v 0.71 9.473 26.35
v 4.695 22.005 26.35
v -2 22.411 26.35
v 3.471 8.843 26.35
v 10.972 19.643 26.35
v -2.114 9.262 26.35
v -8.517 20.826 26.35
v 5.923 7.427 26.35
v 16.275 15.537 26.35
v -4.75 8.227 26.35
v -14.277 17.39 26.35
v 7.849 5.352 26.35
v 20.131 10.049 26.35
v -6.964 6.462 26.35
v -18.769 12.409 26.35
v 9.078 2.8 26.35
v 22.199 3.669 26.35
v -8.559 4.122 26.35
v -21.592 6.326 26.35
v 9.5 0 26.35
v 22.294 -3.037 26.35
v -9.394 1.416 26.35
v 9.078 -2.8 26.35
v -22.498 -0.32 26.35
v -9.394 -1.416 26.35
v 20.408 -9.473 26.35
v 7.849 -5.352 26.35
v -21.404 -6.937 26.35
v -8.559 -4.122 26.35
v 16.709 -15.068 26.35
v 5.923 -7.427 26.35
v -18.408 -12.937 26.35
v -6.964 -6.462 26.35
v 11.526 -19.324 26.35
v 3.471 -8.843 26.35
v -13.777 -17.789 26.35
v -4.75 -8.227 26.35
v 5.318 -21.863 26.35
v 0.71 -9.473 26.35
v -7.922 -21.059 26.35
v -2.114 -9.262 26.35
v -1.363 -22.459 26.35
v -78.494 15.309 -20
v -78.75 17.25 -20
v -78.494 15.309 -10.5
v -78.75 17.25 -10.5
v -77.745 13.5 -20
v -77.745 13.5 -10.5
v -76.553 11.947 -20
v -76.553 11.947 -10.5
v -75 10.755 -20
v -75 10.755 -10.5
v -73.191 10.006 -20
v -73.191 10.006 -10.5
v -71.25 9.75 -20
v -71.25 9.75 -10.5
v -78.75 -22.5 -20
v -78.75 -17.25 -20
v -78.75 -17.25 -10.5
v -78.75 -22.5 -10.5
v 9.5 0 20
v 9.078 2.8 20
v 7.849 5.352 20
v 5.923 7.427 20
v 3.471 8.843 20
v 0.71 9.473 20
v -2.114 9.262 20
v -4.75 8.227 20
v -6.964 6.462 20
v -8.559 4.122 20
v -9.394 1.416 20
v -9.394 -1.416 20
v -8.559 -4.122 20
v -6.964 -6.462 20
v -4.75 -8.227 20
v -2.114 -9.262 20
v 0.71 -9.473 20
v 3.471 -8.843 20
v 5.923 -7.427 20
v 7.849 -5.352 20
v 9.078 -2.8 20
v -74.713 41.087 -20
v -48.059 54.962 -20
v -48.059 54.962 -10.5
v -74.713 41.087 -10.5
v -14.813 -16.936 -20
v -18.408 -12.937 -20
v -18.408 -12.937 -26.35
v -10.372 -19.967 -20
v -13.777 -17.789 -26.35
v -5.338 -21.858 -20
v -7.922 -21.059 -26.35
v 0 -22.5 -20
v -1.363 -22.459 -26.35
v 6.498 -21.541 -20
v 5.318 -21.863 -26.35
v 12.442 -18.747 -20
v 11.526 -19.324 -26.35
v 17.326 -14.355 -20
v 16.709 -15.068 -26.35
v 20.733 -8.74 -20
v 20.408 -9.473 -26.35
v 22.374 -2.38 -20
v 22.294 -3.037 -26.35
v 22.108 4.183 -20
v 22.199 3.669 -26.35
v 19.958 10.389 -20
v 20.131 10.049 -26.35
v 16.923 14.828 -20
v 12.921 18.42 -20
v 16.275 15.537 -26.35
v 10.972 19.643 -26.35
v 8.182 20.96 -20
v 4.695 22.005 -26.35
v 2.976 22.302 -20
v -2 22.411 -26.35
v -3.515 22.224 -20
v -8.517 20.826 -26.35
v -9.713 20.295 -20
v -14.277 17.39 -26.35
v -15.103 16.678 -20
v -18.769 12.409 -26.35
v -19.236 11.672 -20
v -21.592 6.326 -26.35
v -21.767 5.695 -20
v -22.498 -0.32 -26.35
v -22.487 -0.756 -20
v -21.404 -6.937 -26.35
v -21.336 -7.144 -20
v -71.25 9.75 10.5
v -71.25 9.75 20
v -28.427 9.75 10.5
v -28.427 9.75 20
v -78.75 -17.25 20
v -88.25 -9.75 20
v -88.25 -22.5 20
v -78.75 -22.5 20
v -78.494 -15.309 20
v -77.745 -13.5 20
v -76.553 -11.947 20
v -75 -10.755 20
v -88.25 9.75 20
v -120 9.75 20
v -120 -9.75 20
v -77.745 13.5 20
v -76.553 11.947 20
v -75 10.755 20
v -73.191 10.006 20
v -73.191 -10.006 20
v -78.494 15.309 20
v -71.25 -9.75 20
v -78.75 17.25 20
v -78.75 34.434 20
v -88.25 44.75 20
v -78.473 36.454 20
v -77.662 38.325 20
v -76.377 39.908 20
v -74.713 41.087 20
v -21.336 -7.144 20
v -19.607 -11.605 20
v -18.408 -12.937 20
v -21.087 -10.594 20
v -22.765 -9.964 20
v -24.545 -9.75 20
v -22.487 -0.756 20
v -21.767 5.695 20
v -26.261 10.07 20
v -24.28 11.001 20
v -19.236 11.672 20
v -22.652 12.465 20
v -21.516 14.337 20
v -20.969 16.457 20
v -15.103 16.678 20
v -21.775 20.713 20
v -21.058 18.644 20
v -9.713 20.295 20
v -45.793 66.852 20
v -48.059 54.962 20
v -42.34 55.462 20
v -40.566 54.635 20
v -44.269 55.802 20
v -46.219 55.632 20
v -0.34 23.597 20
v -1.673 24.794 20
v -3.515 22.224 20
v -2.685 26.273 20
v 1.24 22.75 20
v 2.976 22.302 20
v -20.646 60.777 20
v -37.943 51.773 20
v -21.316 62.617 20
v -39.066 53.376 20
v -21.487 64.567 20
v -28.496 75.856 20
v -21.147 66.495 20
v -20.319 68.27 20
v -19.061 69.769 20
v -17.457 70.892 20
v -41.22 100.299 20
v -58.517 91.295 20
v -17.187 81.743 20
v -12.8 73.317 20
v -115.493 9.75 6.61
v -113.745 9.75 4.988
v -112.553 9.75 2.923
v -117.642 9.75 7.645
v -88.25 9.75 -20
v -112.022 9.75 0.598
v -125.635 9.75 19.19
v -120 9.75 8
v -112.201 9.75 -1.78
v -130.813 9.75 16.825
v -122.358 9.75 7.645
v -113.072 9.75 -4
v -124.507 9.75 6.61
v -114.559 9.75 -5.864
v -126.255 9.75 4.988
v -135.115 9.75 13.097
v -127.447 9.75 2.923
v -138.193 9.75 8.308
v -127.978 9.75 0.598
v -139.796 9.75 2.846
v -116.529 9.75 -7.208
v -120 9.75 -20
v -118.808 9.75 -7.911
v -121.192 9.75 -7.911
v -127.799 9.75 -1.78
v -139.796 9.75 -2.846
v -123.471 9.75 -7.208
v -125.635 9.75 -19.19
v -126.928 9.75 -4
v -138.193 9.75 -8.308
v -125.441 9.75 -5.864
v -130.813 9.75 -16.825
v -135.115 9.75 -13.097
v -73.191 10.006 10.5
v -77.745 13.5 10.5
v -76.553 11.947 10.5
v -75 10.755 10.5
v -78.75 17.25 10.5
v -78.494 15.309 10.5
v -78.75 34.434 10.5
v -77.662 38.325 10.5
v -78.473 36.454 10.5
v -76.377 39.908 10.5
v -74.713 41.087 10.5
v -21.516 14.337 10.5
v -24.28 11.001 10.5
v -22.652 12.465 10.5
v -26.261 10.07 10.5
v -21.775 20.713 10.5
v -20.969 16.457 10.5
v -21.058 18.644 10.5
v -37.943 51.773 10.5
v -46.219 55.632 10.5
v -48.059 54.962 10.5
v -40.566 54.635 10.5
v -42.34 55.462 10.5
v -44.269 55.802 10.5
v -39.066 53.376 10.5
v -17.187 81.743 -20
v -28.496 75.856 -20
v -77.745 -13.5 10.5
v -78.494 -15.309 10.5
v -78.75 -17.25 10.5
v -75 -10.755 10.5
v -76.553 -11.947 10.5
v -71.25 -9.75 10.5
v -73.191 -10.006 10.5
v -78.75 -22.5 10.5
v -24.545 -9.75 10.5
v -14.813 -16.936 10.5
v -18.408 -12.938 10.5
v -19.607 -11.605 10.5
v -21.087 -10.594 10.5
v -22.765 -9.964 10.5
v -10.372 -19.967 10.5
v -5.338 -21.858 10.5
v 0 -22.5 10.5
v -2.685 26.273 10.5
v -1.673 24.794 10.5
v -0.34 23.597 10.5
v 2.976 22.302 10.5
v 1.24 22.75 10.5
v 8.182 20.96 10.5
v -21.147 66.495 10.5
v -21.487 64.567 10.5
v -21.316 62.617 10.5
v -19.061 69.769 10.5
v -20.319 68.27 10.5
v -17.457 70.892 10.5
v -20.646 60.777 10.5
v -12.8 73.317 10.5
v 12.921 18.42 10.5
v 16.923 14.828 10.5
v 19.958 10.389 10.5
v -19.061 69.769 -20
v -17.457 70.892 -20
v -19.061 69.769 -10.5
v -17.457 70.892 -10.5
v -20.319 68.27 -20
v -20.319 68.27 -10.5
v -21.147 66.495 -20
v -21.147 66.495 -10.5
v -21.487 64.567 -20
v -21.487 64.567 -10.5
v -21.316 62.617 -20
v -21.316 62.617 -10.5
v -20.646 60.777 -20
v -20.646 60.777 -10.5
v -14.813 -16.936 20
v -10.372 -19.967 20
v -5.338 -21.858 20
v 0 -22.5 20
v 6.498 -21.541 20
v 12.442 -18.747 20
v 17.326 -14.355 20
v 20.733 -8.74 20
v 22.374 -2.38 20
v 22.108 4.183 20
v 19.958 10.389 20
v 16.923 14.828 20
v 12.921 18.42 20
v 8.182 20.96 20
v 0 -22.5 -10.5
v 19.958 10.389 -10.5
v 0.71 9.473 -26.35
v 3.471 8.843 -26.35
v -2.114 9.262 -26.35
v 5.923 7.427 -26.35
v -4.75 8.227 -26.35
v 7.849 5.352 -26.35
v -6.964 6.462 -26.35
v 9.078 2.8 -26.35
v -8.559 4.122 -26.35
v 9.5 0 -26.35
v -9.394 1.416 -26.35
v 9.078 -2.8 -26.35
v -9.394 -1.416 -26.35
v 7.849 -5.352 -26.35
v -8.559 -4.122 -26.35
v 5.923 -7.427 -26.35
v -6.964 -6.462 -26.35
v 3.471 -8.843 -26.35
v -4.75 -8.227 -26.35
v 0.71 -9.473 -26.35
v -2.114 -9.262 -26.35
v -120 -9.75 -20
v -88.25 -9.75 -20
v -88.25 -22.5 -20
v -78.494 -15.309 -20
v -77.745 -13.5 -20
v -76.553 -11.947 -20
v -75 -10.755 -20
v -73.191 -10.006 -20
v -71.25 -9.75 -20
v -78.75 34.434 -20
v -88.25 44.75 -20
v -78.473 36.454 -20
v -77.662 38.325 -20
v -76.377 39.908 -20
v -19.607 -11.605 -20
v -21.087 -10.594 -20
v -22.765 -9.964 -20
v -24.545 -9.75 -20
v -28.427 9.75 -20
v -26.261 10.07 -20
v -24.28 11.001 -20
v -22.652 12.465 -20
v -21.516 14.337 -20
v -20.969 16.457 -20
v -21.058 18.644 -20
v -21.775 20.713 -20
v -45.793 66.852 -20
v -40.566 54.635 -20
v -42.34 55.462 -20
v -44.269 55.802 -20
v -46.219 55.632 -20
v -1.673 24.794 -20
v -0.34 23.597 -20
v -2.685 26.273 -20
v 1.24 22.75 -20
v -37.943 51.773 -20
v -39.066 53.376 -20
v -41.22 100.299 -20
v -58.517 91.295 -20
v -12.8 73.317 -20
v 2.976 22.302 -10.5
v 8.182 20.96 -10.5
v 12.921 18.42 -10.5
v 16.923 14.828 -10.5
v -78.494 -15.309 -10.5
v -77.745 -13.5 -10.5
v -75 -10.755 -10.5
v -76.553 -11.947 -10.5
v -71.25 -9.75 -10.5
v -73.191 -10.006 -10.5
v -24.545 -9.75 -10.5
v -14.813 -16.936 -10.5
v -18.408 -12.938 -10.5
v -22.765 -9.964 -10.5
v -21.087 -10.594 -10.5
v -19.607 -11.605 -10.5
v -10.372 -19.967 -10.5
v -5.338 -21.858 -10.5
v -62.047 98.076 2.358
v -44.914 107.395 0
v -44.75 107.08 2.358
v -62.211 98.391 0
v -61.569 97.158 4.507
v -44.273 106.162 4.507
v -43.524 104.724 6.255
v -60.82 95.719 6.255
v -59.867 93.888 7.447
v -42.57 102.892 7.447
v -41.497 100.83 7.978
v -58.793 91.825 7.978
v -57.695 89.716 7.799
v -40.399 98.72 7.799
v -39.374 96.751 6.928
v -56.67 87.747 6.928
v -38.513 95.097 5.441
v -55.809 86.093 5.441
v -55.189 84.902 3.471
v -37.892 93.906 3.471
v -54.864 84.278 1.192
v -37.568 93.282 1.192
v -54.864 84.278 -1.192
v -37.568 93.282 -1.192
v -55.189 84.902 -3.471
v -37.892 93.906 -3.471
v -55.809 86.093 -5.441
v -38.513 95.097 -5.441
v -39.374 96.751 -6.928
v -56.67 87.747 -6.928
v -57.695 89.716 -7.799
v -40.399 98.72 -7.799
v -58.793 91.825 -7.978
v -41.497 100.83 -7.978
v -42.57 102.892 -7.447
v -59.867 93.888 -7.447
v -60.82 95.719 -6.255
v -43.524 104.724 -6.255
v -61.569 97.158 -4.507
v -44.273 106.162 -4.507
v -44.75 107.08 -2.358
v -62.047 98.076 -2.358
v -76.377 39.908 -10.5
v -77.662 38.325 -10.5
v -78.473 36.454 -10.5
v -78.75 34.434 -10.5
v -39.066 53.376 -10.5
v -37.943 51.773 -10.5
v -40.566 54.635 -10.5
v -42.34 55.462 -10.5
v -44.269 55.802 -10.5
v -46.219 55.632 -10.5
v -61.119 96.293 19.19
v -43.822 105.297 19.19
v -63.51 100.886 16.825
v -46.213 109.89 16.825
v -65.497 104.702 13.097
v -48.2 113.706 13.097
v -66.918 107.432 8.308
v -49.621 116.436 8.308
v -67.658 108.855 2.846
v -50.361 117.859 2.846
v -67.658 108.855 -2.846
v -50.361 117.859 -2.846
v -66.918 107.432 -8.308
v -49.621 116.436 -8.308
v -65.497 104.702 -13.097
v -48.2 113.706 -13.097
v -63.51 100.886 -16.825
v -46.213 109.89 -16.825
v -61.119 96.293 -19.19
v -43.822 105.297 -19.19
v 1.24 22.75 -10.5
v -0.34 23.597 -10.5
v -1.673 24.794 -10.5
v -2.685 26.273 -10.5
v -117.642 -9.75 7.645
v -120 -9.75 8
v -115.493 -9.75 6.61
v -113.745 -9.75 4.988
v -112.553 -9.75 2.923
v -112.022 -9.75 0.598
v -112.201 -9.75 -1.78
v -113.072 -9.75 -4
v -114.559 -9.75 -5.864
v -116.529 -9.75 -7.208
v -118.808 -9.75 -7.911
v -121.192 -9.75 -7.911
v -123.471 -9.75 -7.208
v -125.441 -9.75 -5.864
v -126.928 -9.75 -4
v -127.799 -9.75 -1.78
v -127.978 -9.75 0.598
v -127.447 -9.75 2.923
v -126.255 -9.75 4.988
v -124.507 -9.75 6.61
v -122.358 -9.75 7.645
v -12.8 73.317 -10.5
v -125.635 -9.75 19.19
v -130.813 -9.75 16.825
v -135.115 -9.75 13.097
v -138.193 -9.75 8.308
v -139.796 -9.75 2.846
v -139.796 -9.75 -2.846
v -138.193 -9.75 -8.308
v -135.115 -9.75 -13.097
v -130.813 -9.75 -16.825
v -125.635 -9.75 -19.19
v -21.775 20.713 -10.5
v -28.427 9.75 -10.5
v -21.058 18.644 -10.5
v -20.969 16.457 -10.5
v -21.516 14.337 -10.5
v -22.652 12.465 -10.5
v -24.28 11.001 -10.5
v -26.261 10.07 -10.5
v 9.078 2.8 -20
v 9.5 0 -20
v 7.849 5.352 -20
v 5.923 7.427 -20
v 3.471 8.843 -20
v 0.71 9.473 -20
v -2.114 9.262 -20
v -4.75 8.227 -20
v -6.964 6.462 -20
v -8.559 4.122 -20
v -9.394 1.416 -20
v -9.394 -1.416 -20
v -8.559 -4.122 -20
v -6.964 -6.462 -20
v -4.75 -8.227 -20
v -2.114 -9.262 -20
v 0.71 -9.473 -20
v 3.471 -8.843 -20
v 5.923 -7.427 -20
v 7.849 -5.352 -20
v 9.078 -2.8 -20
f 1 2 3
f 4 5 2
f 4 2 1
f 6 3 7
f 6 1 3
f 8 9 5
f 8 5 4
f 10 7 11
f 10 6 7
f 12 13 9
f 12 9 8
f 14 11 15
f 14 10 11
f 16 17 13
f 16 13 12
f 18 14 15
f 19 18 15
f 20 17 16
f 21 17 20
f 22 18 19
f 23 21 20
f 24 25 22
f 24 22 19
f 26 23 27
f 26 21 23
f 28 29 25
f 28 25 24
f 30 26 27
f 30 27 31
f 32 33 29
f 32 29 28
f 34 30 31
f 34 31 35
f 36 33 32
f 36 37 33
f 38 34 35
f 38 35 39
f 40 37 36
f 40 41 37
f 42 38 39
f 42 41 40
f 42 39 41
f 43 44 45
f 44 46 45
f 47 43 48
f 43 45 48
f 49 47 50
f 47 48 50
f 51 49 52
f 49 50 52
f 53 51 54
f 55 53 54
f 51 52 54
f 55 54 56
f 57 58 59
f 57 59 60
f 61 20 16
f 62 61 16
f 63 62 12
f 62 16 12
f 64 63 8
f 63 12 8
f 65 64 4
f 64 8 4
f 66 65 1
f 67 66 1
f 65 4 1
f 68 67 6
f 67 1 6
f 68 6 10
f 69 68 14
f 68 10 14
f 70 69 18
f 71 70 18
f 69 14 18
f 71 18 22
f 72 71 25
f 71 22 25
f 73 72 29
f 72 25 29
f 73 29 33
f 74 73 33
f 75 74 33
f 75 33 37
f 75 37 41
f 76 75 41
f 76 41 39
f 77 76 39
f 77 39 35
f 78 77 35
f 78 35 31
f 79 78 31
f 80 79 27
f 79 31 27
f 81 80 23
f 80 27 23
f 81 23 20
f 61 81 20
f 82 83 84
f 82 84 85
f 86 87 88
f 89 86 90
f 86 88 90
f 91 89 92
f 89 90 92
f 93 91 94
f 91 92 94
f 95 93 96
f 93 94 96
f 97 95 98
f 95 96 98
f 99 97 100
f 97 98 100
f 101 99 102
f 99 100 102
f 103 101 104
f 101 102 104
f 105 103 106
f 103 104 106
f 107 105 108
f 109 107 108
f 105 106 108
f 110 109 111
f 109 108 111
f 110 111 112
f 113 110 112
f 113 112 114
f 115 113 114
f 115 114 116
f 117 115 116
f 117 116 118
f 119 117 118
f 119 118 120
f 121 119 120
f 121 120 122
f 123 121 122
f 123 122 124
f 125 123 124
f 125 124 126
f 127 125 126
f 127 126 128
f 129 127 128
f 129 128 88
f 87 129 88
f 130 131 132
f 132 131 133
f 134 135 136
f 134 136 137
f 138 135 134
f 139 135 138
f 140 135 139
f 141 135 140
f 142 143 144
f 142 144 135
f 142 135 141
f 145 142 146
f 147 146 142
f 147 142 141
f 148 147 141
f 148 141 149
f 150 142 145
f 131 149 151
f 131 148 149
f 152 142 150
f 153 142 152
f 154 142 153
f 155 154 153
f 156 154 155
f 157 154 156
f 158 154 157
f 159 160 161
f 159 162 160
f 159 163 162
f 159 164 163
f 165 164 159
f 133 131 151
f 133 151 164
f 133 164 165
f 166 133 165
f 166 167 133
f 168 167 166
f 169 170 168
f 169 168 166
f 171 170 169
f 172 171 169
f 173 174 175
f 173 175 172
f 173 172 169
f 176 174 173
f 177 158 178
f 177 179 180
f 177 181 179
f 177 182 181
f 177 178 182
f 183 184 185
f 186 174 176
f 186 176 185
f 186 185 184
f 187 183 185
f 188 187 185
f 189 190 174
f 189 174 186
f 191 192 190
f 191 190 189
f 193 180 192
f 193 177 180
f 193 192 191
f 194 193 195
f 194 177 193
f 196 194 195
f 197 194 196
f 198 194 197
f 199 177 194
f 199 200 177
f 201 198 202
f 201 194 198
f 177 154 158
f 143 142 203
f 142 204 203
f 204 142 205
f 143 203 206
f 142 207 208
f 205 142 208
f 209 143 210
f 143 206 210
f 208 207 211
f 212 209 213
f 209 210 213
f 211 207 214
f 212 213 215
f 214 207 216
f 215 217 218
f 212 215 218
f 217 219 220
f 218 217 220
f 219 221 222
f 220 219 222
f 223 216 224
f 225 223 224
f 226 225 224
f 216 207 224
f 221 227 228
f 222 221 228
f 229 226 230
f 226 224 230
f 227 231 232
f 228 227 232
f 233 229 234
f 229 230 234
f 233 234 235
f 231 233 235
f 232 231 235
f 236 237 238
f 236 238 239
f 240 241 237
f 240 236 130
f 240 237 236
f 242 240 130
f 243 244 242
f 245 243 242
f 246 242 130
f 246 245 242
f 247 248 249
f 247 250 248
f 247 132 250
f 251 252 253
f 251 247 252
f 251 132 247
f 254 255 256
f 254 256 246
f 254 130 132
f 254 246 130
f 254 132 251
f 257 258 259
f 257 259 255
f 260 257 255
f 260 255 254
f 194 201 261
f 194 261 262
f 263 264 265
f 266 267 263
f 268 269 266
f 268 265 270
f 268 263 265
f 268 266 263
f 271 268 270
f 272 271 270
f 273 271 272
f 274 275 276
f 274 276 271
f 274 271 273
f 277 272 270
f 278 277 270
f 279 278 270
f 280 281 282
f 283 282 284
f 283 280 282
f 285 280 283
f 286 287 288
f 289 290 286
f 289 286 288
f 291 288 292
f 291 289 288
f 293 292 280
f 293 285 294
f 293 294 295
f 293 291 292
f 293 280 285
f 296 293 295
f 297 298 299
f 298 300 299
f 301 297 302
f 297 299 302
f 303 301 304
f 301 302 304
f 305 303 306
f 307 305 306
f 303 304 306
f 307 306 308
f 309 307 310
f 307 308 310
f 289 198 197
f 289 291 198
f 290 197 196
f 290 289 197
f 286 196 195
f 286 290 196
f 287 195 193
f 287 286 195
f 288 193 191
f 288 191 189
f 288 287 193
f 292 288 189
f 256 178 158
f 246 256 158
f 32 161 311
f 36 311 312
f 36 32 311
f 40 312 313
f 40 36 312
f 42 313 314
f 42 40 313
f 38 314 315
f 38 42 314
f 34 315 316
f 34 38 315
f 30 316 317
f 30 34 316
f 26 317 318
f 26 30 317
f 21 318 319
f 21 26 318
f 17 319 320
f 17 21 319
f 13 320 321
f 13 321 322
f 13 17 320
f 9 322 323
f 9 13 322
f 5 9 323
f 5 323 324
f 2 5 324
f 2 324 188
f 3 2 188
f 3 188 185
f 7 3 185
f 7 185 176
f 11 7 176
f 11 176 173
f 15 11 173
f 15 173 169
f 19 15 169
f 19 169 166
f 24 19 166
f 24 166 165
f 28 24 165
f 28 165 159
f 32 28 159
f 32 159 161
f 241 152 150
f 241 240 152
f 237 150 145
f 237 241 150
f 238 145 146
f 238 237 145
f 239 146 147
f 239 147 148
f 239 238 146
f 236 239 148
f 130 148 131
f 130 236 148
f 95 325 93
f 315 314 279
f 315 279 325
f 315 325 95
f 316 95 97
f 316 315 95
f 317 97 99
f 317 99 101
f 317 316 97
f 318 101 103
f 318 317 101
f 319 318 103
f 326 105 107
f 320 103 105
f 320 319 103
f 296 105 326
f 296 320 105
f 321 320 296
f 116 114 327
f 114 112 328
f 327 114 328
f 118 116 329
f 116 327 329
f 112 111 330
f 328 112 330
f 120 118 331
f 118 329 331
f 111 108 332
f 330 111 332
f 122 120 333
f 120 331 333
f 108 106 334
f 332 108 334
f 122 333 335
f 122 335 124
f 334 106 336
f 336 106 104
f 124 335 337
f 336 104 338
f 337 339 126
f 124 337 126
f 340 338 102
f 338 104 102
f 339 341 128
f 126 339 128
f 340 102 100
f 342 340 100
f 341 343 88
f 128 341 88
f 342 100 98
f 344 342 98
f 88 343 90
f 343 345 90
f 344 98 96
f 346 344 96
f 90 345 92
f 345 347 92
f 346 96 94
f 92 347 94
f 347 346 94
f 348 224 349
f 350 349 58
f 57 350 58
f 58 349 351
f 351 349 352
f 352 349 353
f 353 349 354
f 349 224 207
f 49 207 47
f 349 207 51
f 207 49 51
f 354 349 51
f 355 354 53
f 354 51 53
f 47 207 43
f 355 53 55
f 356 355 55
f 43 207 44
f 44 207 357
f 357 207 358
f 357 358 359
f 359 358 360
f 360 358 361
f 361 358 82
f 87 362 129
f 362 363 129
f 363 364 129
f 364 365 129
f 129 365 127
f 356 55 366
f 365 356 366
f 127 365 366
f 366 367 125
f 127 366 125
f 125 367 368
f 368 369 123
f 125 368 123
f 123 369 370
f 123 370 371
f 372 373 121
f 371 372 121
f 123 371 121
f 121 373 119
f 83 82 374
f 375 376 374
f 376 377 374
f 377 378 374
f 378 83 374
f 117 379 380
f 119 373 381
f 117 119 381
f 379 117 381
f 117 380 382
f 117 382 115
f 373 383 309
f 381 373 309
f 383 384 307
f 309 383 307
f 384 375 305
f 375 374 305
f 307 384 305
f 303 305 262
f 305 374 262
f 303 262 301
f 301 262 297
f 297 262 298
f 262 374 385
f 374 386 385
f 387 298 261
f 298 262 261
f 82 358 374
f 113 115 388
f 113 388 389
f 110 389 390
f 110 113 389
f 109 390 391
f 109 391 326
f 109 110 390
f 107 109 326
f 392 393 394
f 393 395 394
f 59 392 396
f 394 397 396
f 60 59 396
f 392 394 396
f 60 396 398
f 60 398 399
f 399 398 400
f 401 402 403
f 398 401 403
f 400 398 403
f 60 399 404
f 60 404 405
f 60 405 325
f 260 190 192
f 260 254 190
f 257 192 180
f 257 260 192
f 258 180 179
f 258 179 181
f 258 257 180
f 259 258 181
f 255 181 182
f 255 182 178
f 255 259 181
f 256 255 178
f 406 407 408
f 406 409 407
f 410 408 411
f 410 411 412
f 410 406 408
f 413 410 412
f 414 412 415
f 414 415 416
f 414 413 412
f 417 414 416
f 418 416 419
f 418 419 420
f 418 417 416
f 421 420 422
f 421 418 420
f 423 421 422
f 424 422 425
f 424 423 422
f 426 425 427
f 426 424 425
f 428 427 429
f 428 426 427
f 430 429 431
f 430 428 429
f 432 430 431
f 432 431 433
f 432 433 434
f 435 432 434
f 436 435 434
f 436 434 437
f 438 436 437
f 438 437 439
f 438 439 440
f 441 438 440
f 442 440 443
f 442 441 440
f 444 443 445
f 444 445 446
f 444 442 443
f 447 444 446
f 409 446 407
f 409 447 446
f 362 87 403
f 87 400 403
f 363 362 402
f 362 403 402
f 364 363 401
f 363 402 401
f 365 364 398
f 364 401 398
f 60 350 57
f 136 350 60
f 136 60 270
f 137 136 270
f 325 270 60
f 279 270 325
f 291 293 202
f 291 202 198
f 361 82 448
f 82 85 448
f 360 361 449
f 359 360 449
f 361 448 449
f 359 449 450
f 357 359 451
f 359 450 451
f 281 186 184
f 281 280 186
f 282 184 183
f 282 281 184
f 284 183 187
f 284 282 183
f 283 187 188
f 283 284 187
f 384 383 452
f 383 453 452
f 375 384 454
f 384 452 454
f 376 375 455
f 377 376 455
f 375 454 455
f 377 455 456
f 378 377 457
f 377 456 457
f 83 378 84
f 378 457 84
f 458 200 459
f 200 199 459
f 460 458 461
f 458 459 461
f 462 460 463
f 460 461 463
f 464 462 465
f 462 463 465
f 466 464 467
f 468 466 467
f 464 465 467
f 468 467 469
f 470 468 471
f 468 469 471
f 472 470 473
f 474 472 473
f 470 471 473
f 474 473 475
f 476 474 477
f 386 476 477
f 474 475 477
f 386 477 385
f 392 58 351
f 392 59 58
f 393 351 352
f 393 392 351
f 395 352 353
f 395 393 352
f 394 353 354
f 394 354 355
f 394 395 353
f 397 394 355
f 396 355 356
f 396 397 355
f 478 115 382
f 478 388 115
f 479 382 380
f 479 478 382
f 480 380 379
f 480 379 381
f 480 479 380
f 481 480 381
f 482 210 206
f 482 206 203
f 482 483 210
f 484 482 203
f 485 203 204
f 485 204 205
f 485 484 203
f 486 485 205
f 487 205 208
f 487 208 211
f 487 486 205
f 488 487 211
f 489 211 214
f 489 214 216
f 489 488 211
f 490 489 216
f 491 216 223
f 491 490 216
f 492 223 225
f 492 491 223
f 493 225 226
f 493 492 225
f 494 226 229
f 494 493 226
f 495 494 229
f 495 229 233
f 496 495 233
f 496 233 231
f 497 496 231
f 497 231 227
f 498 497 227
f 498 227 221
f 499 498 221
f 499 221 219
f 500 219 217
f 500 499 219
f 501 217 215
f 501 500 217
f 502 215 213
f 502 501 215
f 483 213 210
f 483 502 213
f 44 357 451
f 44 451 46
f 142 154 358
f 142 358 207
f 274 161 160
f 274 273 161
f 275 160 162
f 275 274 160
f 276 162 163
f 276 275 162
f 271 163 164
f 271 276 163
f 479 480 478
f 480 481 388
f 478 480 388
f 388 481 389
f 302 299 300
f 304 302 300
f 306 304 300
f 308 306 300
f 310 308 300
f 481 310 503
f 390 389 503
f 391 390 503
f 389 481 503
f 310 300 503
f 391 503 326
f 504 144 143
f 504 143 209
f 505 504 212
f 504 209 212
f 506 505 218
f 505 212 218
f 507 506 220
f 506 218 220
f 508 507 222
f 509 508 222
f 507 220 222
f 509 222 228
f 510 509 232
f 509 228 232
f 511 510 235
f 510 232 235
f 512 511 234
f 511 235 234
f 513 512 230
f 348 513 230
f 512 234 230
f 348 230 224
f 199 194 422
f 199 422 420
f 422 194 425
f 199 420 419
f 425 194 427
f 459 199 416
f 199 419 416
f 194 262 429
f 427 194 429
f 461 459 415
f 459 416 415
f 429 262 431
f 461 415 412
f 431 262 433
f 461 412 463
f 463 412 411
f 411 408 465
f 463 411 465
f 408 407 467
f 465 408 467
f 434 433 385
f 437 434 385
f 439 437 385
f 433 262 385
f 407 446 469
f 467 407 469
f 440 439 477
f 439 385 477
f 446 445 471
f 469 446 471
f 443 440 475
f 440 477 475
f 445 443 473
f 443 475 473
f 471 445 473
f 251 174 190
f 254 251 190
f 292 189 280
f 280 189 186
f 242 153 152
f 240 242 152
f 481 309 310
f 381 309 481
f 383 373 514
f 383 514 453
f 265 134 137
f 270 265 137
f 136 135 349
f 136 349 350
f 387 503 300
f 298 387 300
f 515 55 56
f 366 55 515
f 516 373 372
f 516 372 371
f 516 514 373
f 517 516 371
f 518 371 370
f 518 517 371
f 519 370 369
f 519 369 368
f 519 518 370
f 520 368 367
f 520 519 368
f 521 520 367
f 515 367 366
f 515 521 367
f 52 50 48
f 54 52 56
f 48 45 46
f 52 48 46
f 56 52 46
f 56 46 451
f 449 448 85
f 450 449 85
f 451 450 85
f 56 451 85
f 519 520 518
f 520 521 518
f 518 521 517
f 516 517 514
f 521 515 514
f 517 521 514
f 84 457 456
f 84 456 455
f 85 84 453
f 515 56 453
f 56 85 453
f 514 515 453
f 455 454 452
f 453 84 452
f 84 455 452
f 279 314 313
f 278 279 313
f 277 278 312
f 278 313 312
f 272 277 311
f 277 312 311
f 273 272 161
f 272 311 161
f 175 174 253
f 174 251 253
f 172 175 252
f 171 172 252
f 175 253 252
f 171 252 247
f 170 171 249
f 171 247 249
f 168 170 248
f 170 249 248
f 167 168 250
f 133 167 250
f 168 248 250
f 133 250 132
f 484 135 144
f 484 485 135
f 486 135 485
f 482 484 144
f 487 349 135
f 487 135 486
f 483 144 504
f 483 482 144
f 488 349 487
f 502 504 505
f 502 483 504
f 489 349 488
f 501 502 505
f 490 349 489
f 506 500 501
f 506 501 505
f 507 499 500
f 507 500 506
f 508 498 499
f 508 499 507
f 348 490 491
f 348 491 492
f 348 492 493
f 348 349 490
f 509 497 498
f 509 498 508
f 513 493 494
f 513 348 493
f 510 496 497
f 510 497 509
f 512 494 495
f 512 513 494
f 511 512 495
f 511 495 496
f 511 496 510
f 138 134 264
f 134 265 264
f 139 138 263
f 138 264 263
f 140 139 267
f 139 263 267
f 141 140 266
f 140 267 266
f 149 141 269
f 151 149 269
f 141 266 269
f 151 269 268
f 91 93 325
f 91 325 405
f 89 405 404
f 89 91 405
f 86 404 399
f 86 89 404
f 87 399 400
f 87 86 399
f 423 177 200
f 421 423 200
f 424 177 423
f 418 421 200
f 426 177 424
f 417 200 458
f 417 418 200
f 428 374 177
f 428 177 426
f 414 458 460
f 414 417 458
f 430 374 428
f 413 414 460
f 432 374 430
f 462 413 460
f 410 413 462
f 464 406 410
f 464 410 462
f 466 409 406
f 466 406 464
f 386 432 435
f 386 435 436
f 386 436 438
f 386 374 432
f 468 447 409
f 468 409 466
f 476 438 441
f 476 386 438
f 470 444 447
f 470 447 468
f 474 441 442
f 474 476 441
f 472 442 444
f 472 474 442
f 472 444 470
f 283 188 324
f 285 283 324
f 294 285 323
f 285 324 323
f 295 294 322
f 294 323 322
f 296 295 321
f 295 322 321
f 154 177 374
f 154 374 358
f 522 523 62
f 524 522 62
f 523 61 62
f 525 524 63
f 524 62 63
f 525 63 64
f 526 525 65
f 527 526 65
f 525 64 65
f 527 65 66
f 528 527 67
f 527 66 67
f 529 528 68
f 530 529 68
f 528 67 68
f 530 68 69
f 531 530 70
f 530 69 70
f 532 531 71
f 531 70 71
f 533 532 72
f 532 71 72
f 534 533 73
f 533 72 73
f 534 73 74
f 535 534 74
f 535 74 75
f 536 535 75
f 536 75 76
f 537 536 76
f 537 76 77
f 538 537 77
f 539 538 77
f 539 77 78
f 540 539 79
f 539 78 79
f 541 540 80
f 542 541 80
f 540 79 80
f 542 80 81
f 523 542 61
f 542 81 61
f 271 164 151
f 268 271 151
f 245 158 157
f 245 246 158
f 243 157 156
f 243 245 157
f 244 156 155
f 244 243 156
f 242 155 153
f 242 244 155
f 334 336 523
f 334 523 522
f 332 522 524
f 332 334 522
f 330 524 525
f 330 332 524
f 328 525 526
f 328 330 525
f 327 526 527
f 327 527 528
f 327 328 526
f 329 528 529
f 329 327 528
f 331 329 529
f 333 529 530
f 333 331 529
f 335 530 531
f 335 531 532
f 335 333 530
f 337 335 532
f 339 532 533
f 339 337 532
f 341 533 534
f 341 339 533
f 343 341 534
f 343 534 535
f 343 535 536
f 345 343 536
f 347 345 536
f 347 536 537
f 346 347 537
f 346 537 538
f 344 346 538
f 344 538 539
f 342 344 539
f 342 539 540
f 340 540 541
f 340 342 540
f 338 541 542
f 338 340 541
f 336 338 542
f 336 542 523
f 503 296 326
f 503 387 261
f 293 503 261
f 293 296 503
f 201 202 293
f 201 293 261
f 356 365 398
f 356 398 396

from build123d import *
from build123d.topology import SkipClean

# Parameters (mm, degrees)
SKETCH2_R            = 8
BOSS_EXTRUDE1_DEPTH  = 9.75
SKETCH3_R            = 8
BOSS_EXTRUDE2_DEPTH  = 9.75
SKETCH5_R            = 22.5
BOSS_EXTRUDE3_DEPTH  = 20
SKETCH6_R            = 9.5
CUT_EXTRUDE1_DEPTH   = 20
CUT_EXTRUDE3_DEPTH   = 9.5
FILLET1_R            = 7.5
FILLET1_OF_MIRROR1_R = 7.5
BOSS_EXTRUDE5_START  = 6.35
SKETCH9_R            = 22.5
SKETCH9_R_2          = 9.5
BOSS_EXTRUDE5_DEPTH  = 6.35


with BuildPart() as part:
    # Sketch2 → Boss-Extrude1 (new, symmetric)
    with BuildSketch(Plane(origin=(0, 0, 0), x_dir=(1, 0, 0), z_dir=(0, 1, 0))):
        with BuildLine():
            Line((0, -20), (-120, -20))
            ThreePointArc((-120, -20), (-140, 0), (-120, 20))
            Line((-120, 20), (0, 20))
            Line((0, 20), (0, -20))
        make_face()
        with Locations(Location((-120, 0, 0), (0, 0, 270))):
            Circle(SKETCH2_R, mode=Mode.SUBTRACT)
    extrude(amount=BOSS_EXTRUDE1_DEPTH, both=True)

    # Sketch3 → Boss-Extrude2 (add, symmetric)
    with BuildSketch(Plane(origin=(0, 0, 0), x_dir=(0.46174861323503175, -0.8870108331782229, 0), z_dir=(0.8870108331782228, 0.4617486132350317, 0))):
        with BuildLine():
            Line((0, -20), (-108, -20))
            ThreePointArc((-108, -20), (-128, 0), (-108, 20))
            Line((-108, 20), (0, 20))
            Line((0, 20), (0, -20))
        make_face()
        with Locations(Location((-108, 0, 0), (0, 0, 180))):
            Circle(SKETCH3_R, mode=Mode.SUBTRACT)
    extrude(amount=BOSS_EXTRUDE2_DEPTH, both=True)

    # Sketch5 → Boss-Extrude3 (add, symmetric)
    with BuildSketch(Plane.XY):
        with BuildLine():
            Line((-88.25, -22.5), (0, -22.5))
            ThreePointArc((0, -22.5), (-19.23551709, 11.672398309), (19.957743747, 10.389343798))
            Line((19.957743747, 10.389343798), (-17.18672299, 81.743200515))
            Line((-17.18672299, 81.743200515), (-88.25, 44.75))
            Line((-88.25, 44.75), (-88.25, -22.5))
        make_face()
        Circle(SKETCH5_R)
    extrude(amount=BOSS_EXTRUDE3_DEPTH, both=True)

    # Sketch6 → Cut-Extrude1 (cut, symmetric)
    with BuildSketch(Plane.XY):
        Circle(SKETCH6_R)
    extrude(amount=CUT_EXTRUDE1_DEPTH, both=True, mode=Mode.SUBTRACT)

    # Sketch7 → Cut-Extrude3 (cut)
    with BuildSketch(Plane.XY.offset(20)):
        with BuildLine():
            Line((-78.75, -22.5), (0, -22.5))
            ThreePointArc((0, -22.5), (-11.976539567, -19.047637649), (-20.277758752, -9.75))
            Line((-20.277758752, -9.75), (-78.75, -9.75))
            Line((-78.75, -9.75), (-78.75, -22.5))
        make_face()
        with BuildLine():
            Line((-12.800111165, 73.3165976), (-24.109499288, 67.429302781))
            Line((-24.109499288, 67.429302781), (-0.71487136, 22.488640665))
            ThreePointArc((-0.71487136, 22.488640665), (11.365310405, 19.41854061), (19.957743747, 10.389343798))
            Line((19.957743747, 10.389343798), (-12.800111165, 73.3165976))
        make_face()
        Polygon((-16.067502725, 9.75), (-41.406210535, 58.425204823), (-78.75, 38.985258485), (-78.75, 9.75), align=None)
    cut_extrude3 = extrude(amount=-CUT_EXTRUDE3_DEPTH, mode=Mode.SUBTRACT)

    # Fillet1
    fillet1_edges = [part.edges().sort_by_distance(p)[0] for p in [
        (-20.277758752, -9.75, 15.25),
        (-78.75, -9.75, 15.25),
        (-78.75, 38.985258485, 15.25),
        (-41.406210535, 58.425204823, 15.25),
        (-16.067502725, 9.75, 15.25),
        (-78.75, 9.75, 15.25),
        (-0.71487136, 22.488640665, 15.25),
        (-24.109499288, 67.429302781, 15.25),
    ]]
    fillet(fillet1_edges, radius=FILLET1_R)

    # Mirror1: Cut-Extrude3 across plane
    add(cut_extrude3.mirror(Plane.XY), mode=Mode.SUBTRACT)

    # Fillet1 of Mirror1
    fillet1_of_mirror1_edges = [part.edges().sort_by_distance(p)[0] for p in [
        (-20.277758752, -9.75, -15.25),
        (-78.75, -9.75, -15.25),
        (-78.75, 38.985258485, -15.25),
        (-41.406210535, 58.425204823, -15.25),
        (-16.067502725, 9.75, -15.25),
        (-78.75, 9.75, -15.25),
        (-0.71487136, 22.488640665, -15.25),
        (-24.109499288, 67.429302781, -15.25),
    ]]
    fillet(fillet1_of_mirror1_edges, radius=FILLET1_OF_MIRROR1_R)

    # Sketch9 → Boss-Extrude5 (add)
    with SkipClean():  # the faces are left unmerged after this step: merging them gives an invalid solid
        with BuildSketch(Plane.XY.offset(20).offset(BOSS_EXTRUDE5_START)):
            with Locations(Location((0, 0, 0), (0, 0, 215.099632195))):
                Circle(SKETCH9_R)
            Circle(SKETCH9_R_2, mode=Mode.SUBTRACT)
        boss_extrude5 = extrude(amount=-BOSS_EXTRUDE5_DEPTH)

    # Mirror2: Boss-Extrude5 across plane
    with SkipClean():  # the faces are left unmerged after this step: merging them gives an invalid solid
        add(boss_extrude5.mirror(Plane.XY))


solid = part.part
